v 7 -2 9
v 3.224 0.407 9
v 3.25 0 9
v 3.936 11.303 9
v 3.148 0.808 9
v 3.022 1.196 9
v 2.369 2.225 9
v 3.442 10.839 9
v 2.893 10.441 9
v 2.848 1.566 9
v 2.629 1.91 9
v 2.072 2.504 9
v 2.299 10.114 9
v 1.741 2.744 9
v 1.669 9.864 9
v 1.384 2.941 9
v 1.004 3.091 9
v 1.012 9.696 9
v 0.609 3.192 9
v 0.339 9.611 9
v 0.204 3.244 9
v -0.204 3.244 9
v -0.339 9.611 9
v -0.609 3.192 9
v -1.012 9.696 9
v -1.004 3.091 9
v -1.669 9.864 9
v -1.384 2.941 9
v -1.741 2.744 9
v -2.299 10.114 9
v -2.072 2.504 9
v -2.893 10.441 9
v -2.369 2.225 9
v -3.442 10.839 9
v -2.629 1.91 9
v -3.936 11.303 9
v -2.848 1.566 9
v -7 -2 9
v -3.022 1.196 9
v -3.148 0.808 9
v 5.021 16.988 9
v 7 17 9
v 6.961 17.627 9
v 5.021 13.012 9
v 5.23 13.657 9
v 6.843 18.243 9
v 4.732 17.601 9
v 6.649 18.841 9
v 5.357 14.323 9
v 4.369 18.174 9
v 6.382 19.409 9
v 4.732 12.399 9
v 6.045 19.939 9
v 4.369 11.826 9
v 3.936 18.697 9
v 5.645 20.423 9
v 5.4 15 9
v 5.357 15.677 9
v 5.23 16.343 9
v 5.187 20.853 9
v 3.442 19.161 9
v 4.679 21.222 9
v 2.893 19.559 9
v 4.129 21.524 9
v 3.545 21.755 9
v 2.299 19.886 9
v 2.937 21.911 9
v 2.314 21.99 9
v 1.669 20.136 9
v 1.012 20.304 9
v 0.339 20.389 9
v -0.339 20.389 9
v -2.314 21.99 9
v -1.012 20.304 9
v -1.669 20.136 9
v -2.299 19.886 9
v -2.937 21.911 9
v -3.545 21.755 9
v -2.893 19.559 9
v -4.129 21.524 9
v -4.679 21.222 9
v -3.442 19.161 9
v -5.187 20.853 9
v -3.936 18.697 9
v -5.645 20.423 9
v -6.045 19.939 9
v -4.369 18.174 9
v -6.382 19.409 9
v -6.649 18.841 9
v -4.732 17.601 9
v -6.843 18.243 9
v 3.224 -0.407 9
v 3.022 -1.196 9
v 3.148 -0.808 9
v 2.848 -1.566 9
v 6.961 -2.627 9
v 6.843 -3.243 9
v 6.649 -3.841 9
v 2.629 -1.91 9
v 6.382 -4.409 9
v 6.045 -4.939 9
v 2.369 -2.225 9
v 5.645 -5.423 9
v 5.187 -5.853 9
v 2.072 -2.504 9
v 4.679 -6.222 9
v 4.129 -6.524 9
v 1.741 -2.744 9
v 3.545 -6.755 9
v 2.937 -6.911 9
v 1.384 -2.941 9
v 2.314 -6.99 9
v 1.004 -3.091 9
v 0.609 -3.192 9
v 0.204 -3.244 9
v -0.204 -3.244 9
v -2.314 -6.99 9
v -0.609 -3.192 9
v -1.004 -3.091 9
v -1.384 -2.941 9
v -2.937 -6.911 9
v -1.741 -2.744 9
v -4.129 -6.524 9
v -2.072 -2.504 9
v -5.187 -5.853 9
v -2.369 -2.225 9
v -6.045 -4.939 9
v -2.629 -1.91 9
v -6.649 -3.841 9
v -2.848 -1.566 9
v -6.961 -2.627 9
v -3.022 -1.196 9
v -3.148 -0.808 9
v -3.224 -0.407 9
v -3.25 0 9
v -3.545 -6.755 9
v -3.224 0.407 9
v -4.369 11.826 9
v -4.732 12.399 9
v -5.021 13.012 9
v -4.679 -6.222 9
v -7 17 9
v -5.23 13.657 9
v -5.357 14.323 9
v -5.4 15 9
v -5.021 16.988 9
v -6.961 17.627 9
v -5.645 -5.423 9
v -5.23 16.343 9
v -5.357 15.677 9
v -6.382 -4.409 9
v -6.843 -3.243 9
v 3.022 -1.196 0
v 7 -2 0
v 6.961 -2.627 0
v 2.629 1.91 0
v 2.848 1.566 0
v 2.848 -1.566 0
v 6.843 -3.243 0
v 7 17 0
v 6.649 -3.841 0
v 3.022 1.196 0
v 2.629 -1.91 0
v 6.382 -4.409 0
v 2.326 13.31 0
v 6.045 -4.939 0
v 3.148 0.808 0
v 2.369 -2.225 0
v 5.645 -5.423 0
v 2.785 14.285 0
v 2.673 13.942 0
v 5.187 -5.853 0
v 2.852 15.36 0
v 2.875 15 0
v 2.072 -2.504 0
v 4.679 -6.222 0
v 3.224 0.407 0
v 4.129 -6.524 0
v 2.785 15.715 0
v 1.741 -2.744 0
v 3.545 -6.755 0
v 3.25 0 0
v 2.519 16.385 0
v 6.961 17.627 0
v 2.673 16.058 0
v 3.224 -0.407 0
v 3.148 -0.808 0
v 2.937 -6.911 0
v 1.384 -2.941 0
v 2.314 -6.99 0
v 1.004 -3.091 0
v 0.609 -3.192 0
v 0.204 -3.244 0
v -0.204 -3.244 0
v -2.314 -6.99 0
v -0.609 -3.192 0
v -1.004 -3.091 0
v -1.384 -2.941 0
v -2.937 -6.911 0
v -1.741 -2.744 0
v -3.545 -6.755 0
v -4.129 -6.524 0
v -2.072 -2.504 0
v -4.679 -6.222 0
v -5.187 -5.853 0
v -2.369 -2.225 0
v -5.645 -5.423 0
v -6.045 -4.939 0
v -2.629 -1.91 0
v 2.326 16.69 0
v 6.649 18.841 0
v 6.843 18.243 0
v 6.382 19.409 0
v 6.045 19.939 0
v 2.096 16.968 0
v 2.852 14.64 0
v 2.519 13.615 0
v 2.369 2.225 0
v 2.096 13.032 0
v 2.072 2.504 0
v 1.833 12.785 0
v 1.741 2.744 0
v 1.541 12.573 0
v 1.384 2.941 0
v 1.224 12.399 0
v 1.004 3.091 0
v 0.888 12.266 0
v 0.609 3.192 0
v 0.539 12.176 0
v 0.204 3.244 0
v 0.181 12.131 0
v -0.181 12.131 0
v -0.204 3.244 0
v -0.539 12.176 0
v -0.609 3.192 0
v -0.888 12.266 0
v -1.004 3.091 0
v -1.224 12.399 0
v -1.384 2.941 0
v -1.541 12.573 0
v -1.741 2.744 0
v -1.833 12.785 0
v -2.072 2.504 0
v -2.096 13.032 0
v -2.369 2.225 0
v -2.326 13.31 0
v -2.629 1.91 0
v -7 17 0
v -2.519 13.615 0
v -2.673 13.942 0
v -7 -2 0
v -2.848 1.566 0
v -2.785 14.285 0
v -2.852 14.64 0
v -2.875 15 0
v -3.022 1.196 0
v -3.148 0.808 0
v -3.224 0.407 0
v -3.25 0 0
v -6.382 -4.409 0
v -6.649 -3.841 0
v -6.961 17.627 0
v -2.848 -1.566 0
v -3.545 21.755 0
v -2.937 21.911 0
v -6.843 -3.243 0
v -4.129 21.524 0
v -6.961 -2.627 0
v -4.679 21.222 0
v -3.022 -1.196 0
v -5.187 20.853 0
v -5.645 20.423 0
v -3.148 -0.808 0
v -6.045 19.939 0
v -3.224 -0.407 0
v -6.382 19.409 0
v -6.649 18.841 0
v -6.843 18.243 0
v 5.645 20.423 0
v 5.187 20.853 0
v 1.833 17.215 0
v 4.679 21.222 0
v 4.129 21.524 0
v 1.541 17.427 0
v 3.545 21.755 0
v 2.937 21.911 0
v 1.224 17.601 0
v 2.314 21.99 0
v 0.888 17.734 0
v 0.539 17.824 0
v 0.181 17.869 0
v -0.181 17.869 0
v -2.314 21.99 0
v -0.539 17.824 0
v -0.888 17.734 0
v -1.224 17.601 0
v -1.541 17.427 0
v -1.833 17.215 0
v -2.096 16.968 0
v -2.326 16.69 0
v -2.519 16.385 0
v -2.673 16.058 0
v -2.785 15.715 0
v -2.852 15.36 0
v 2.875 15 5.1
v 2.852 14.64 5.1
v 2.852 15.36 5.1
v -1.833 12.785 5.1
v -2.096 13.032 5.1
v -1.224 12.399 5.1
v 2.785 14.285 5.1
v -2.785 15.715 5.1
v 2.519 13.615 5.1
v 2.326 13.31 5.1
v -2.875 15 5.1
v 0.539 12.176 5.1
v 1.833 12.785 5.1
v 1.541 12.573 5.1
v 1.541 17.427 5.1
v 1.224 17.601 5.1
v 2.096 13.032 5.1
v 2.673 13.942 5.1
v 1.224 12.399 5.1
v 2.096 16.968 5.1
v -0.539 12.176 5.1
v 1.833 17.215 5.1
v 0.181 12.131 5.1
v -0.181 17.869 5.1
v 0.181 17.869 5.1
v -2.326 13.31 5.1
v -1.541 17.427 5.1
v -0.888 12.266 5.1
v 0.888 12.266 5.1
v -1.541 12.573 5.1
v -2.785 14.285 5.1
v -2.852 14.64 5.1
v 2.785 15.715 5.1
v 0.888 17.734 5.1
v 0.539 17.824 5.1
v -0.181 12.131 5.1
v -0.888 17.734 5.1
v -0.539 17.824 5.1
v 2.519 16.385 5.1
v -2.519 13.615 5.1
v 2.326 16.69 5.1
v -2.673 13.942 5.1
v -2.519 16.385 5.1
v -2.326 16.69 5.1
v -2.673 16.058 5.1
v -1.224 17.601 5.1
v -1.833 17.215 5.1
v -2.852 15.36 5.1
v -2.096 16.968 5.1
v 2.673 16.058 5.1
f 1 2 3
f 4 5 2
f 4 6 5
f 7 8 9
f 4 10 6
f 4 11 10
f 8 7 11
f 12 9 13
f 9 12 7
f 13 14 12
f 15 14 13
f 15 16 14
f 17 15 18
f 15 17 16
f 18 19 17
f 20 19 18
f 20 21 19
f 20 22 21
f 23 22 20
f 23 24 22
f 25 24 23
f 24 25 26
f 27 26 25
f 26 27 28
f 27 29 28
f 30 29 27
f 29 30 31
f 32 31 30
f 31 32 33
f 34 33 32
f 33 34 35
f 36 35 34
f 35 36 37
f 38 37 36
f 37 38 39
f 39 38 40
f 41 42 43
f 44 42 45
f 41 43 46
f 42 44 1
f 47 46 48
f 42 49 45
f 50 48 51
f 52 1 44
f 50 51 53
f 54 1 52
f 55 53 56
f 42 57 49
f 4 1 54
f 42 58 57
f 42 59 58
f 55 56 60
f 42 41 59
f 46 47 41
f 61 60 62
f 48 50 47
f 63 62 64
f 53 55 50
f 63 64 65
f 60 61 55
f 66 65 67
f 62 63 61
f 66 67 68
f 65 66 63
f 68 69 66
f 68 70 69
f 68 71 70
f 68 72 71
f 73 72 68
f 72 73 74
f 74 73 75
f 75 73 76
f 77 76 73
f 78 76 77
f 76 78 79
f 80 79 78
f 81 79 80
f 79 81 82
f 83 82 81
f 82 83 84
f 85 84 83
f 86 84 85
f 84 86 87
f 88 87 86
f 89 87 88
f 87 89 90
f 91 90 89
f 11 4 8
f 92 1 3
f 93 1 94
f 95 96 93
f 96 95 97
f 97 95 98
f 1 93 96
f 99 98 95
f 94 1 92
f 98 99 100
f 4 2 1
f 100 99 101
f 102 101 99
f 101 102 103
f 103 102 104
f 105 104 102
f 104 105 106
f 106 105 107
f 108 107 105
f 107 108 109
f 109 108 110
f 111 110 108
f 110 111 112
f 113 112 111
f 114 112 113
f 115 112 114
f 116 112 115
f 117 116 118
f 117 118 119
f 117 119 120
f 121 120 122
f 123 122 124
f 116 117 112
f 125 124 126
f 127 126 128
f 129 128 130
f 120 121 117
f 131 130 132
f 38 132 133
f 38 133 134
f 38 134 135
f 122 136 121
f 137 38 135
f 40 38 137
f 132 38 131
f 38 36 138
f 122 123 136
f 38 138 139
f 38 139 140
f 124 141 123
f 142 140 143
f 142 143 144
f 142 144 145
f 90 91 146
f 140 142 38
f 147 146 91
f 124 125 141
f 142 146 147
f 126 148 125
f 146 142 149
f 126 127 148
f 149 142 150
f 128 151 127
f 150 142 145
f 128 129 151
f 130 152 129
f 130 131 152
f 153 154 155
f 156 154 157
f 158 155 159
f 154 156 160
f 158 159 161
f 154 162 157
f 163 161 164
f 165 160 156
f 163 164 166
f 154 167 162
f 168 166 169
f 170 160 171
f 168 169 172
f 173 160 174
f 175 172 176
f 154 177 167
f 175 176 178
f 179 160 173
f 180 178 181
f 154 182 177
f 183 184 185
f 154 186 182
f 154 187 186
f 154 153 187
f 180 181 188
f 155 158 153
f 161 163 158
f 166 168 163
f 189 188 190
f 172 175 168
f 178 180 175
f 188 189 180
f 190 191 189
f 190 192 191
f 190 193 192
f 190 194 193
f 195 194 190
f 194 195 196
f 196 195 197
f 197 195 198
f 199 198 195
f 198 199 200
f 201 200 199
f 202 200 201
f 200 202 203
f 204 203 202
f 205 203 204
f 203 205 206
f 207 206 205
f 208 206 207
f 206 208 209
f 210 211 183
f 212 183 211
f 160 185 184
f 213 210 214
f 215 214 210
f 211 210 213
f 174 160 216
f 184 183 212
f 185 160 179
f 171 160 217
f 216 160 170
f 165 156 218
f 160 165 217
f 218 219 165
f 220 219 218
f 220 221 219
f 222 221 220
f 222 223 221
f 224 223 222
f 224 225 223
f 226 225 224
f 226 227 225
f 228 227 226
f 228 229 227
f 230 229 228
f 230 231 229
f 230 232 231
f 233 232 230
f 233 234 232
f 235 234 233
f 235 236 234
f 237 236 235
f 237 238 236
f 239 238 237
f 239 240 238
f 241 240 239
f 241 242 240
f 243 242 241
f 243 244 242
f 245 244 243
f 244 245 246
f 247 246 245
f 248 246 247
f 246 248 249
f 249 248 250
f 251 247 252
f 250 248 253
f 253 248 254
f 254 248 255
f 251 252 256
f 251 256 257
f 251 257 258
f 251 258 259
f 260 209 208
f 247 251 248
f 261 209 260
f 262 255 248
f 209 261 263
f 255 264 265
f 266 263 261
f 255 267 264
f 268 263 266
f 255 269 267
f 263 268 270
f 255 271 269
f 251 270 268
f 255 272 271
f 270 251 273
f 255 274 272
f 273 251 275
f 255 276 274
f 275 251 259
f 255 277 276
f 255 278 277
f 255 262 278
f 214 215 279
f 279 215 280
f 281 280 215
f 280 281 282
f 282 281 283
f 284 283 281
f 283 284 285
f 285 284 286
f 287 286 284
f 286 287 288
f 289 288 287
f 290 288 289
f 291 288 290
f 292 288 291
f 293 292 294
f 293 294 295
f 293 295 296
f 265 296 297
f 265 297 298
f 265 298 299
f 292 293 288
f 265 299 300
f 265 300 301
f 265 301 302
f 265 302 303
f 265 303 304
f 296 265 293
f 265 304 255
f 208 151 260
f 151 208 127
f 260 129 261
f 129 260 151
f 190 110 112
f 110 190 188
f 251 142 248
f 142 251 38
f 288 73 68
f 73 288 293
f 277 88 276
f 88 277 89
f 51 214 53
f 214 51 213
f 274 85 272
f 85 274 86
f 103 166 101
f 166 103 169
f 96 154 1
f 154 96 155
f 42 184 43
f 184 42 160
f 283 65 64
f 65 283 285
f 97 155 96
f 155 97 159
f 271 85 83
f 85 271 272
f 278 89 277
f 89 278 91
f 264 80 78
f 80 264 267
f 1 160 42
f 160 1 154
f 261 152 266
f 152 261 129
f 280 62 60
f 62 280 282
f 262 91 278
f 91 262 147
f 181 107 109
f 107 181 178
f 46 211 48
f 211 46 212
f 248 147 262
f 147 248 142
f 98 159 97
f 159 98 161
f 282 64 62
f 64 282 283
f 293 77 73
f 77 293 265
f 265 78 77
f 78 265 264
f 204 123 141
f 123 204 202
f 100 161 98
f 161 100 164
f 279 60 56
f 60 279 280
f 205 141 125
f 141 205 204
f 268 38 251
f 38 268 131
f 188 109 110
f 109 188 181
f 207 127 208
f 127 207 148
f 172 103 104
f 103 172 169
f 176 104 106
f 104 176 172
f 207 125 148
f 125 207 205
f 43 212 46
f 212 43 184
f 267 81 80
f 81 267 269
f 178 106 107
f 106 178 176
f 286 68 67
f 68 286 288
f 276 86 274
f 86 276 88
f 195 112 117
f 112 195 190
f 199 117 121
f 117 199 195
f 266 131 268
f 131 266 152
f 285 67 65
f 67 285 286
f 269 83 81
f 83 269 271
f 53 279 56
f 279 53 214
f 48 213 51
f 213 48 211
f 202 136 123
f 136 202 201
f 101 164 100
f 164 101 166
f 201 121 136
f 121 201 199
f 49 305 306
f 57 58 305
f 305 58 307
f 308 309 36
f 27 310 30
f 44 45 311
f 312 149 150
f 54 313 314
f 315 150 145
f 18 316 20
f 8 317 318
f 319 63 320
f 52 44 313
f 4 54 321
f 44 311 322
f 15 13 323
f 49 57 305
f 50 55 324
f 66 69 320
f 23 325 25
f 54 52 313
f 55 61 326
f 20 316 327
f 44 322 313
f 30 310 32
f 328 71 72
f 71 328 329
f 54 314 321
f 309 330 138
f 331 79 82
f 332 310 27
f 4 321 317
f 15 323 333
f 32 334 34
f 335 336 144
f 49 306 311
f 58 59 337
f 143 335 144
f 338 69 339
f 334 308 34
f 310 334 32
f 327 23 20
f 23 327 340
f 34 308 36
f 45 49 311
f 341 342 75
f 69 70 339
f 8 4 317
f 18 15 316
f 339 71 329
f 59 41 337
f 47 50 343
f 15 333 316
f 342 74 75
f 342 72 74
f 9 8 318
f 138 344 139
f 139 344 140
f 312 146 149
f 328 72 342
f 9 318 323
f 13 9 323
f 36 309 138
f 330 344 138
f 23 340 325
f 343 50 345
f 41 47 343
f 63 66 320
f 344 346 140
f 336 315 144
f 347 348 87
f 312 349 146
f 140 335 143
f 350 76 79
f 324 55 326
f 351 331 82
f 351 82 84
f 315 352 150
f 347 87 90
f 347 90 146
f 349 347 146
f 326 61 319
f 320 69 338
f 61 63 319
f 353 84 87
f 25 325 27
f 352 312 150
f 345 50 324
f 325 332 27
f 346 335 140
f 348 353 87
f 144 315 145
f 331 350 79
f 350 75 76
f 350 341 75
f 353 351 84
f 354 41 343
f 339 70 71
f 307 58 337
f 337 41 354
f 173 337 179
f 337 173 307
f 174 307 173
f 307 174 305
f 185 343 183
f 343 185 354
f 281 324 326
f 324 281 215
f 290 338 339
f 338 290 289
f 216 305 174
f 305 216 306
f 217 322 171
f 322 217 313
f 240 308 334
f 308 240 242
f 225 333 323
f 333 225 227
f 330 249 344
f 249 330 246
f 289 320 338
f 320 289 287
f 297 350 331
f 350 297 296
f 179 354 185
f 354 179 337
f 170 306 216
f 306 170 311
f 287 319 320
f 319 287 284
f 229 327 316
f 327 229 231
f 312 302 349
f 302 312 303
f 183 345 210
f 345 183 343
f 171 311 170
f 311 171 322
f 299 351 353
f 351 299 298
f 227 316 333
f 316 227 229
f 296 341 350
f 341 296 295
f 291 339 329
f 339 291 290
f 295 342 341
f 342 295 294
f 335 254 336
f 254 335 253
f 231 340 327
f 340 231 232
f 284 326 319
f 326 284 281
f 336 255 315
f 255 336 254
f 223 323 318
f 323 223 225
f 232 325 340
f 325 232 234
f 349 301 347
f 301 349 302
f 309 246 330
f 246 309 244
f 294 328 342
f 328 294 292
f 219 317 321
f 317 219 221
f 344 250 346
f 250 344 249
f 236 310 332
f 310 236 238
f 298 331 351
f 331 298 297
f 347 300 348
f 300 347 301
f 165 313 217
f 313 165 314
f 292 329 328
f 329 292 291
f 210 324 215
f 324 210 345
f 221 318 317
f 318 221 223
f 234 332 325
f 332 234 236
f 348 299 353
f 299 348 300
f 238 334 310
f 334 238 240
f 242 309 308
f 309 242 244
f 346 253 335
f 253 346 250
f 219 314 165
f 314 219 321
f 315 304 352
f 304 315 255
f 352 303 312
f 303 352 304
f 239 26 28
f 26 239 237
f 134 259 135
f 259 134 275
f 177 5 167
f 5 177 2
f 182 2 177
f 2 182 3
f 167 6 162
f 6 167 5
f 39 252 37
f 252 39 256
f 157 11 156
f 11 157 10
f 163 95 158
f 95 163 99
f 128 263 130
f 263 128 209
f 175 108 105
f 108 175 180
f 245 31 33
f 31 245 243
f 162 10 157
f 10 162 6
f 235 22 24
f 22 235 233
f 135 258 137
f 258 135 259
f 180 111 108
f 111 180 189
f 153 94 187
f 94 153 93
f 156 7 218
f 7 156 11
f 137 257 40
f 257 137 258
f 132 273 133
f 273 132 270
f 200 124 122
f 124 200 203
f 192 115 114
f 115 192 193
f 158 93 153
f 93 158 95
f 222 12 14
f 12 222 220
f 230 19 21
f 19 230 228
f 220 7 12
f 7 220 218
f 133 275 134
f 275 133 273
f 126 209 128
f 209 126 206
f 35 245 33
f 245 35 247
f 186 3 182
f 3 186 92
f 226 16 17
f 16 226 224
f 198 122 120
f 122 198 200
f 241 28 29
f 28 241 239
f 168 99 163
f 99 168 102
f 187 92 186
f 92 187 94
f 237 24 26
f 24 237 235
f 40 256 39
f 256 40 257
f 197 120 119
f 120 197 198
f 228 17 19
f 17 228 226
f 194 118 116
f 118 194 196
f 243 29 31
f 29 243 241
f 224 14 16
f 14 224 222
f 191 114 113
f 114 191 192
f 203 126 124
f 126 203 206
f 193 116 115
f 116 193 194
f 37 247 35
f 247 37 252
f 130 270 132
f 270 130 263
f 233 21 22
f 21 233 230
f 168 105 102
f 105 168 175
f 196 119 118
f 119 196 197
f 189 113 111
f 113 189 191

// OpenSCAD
$fn = 50;


difference() {
	union() {
		cylinder(h = 9, r = 7.0000000000);
		translate(v = [0.0000000000, 7.5000000000, 0]) {
			hull() {
				translate(v = [-2.0000000000, 9.5000000000, 0]) {
					cylinder(h = 9, r = 5);
				}
				translate(v = [2.0000000000, 9.5000000000, 0]) {
					cylinder(h = 9, r = 5);
				}
				translate(v = [-2.0000000000, -9.5000000000, 0]) {
					cylinder(h = 9, r = 5);
				}
				translate(v = [2.0000000000, -9.5000000000, 0]) {
					cylinder(h = 9, r = 5);
				}
			}
		}
		translate(v = [0.0000000000, 7.5000000000, 0]) {
			hull() {
				translate(v = [-2.0000000000, 9.5000000000, 0]) {
					cylinder(h = 9, r = 5);
				}
				translate(v = [2.0000000000, 9.5000000000, 0]) {
					cylinder(h = 9, r = 5);
				}
				translate(v = [-2.0000000000, -9.5000000000, 0]) {
					cylinder(h = 9, r = 5);
				}
				translate(v = [2.0000000000, -9.5000000000, 0]) {
					cylinder(h = 9, r = 5);
				}
			}
		}
	}
	union() {
		translate(v = [0.0000000000, 15.0000000000, 9]) {
			rotate(a = [0, 0, 0]) {
				difference() {
					union() {
						#translate(v = [0, 0, -9.0000000000]) {
							cylinder(h = 9, r = 2.6000000000);
						}
						#translate(v = [0, 0, -3.9000000000]) {
							cylinder(h = 3.9000000000, r1 = 2.8750000000, r2 = 5.4000000000);
						}
						#translate(v = [0, 0, -9.0000000000]) {
							cylinder(h = 9, r = 2.8750000000);
						}
						#translate(v = [0, 0, -9.0000000000]) {
							cylinder(h = 9, r = 2.6000000000);
						}
					}
					union();
				}
			}
		}
		translate(v = [0.0000000000, 15.0000000000, 9]) {
			rotate(a = [0, 0, 0]) {
				difference() {
					union() {
						#translate(v = [0, 0, -9.0000000000]) {
							cylinder(h = 9, r = 2.6000000000);
						}
						#translate(v = [0, 0, -3.9000000000]) {
							cylinder(h = 3.9000000000, r1 = 2.8750000000, r2 = 5.4000000000);
						}
						#translate(v = [0, 0, -9.0000000000]) {
							cylinder(h = 9, r = 2.8750000000);
						}
						#translate(v = [0, 0, -9.0000000000]) {
							cylinder(h = 9, r = 2.6000000000);
						}
					}
					union();
				}
			}
		}
		translate(v = [0, 0, -100]) {
			cylinder(h = 200, r = 3.2500000000);
		}
		translate(v = [0, 0, -100]) {
			cylinder(h = 200, r = 1.8000000000);
		}
	}
}
